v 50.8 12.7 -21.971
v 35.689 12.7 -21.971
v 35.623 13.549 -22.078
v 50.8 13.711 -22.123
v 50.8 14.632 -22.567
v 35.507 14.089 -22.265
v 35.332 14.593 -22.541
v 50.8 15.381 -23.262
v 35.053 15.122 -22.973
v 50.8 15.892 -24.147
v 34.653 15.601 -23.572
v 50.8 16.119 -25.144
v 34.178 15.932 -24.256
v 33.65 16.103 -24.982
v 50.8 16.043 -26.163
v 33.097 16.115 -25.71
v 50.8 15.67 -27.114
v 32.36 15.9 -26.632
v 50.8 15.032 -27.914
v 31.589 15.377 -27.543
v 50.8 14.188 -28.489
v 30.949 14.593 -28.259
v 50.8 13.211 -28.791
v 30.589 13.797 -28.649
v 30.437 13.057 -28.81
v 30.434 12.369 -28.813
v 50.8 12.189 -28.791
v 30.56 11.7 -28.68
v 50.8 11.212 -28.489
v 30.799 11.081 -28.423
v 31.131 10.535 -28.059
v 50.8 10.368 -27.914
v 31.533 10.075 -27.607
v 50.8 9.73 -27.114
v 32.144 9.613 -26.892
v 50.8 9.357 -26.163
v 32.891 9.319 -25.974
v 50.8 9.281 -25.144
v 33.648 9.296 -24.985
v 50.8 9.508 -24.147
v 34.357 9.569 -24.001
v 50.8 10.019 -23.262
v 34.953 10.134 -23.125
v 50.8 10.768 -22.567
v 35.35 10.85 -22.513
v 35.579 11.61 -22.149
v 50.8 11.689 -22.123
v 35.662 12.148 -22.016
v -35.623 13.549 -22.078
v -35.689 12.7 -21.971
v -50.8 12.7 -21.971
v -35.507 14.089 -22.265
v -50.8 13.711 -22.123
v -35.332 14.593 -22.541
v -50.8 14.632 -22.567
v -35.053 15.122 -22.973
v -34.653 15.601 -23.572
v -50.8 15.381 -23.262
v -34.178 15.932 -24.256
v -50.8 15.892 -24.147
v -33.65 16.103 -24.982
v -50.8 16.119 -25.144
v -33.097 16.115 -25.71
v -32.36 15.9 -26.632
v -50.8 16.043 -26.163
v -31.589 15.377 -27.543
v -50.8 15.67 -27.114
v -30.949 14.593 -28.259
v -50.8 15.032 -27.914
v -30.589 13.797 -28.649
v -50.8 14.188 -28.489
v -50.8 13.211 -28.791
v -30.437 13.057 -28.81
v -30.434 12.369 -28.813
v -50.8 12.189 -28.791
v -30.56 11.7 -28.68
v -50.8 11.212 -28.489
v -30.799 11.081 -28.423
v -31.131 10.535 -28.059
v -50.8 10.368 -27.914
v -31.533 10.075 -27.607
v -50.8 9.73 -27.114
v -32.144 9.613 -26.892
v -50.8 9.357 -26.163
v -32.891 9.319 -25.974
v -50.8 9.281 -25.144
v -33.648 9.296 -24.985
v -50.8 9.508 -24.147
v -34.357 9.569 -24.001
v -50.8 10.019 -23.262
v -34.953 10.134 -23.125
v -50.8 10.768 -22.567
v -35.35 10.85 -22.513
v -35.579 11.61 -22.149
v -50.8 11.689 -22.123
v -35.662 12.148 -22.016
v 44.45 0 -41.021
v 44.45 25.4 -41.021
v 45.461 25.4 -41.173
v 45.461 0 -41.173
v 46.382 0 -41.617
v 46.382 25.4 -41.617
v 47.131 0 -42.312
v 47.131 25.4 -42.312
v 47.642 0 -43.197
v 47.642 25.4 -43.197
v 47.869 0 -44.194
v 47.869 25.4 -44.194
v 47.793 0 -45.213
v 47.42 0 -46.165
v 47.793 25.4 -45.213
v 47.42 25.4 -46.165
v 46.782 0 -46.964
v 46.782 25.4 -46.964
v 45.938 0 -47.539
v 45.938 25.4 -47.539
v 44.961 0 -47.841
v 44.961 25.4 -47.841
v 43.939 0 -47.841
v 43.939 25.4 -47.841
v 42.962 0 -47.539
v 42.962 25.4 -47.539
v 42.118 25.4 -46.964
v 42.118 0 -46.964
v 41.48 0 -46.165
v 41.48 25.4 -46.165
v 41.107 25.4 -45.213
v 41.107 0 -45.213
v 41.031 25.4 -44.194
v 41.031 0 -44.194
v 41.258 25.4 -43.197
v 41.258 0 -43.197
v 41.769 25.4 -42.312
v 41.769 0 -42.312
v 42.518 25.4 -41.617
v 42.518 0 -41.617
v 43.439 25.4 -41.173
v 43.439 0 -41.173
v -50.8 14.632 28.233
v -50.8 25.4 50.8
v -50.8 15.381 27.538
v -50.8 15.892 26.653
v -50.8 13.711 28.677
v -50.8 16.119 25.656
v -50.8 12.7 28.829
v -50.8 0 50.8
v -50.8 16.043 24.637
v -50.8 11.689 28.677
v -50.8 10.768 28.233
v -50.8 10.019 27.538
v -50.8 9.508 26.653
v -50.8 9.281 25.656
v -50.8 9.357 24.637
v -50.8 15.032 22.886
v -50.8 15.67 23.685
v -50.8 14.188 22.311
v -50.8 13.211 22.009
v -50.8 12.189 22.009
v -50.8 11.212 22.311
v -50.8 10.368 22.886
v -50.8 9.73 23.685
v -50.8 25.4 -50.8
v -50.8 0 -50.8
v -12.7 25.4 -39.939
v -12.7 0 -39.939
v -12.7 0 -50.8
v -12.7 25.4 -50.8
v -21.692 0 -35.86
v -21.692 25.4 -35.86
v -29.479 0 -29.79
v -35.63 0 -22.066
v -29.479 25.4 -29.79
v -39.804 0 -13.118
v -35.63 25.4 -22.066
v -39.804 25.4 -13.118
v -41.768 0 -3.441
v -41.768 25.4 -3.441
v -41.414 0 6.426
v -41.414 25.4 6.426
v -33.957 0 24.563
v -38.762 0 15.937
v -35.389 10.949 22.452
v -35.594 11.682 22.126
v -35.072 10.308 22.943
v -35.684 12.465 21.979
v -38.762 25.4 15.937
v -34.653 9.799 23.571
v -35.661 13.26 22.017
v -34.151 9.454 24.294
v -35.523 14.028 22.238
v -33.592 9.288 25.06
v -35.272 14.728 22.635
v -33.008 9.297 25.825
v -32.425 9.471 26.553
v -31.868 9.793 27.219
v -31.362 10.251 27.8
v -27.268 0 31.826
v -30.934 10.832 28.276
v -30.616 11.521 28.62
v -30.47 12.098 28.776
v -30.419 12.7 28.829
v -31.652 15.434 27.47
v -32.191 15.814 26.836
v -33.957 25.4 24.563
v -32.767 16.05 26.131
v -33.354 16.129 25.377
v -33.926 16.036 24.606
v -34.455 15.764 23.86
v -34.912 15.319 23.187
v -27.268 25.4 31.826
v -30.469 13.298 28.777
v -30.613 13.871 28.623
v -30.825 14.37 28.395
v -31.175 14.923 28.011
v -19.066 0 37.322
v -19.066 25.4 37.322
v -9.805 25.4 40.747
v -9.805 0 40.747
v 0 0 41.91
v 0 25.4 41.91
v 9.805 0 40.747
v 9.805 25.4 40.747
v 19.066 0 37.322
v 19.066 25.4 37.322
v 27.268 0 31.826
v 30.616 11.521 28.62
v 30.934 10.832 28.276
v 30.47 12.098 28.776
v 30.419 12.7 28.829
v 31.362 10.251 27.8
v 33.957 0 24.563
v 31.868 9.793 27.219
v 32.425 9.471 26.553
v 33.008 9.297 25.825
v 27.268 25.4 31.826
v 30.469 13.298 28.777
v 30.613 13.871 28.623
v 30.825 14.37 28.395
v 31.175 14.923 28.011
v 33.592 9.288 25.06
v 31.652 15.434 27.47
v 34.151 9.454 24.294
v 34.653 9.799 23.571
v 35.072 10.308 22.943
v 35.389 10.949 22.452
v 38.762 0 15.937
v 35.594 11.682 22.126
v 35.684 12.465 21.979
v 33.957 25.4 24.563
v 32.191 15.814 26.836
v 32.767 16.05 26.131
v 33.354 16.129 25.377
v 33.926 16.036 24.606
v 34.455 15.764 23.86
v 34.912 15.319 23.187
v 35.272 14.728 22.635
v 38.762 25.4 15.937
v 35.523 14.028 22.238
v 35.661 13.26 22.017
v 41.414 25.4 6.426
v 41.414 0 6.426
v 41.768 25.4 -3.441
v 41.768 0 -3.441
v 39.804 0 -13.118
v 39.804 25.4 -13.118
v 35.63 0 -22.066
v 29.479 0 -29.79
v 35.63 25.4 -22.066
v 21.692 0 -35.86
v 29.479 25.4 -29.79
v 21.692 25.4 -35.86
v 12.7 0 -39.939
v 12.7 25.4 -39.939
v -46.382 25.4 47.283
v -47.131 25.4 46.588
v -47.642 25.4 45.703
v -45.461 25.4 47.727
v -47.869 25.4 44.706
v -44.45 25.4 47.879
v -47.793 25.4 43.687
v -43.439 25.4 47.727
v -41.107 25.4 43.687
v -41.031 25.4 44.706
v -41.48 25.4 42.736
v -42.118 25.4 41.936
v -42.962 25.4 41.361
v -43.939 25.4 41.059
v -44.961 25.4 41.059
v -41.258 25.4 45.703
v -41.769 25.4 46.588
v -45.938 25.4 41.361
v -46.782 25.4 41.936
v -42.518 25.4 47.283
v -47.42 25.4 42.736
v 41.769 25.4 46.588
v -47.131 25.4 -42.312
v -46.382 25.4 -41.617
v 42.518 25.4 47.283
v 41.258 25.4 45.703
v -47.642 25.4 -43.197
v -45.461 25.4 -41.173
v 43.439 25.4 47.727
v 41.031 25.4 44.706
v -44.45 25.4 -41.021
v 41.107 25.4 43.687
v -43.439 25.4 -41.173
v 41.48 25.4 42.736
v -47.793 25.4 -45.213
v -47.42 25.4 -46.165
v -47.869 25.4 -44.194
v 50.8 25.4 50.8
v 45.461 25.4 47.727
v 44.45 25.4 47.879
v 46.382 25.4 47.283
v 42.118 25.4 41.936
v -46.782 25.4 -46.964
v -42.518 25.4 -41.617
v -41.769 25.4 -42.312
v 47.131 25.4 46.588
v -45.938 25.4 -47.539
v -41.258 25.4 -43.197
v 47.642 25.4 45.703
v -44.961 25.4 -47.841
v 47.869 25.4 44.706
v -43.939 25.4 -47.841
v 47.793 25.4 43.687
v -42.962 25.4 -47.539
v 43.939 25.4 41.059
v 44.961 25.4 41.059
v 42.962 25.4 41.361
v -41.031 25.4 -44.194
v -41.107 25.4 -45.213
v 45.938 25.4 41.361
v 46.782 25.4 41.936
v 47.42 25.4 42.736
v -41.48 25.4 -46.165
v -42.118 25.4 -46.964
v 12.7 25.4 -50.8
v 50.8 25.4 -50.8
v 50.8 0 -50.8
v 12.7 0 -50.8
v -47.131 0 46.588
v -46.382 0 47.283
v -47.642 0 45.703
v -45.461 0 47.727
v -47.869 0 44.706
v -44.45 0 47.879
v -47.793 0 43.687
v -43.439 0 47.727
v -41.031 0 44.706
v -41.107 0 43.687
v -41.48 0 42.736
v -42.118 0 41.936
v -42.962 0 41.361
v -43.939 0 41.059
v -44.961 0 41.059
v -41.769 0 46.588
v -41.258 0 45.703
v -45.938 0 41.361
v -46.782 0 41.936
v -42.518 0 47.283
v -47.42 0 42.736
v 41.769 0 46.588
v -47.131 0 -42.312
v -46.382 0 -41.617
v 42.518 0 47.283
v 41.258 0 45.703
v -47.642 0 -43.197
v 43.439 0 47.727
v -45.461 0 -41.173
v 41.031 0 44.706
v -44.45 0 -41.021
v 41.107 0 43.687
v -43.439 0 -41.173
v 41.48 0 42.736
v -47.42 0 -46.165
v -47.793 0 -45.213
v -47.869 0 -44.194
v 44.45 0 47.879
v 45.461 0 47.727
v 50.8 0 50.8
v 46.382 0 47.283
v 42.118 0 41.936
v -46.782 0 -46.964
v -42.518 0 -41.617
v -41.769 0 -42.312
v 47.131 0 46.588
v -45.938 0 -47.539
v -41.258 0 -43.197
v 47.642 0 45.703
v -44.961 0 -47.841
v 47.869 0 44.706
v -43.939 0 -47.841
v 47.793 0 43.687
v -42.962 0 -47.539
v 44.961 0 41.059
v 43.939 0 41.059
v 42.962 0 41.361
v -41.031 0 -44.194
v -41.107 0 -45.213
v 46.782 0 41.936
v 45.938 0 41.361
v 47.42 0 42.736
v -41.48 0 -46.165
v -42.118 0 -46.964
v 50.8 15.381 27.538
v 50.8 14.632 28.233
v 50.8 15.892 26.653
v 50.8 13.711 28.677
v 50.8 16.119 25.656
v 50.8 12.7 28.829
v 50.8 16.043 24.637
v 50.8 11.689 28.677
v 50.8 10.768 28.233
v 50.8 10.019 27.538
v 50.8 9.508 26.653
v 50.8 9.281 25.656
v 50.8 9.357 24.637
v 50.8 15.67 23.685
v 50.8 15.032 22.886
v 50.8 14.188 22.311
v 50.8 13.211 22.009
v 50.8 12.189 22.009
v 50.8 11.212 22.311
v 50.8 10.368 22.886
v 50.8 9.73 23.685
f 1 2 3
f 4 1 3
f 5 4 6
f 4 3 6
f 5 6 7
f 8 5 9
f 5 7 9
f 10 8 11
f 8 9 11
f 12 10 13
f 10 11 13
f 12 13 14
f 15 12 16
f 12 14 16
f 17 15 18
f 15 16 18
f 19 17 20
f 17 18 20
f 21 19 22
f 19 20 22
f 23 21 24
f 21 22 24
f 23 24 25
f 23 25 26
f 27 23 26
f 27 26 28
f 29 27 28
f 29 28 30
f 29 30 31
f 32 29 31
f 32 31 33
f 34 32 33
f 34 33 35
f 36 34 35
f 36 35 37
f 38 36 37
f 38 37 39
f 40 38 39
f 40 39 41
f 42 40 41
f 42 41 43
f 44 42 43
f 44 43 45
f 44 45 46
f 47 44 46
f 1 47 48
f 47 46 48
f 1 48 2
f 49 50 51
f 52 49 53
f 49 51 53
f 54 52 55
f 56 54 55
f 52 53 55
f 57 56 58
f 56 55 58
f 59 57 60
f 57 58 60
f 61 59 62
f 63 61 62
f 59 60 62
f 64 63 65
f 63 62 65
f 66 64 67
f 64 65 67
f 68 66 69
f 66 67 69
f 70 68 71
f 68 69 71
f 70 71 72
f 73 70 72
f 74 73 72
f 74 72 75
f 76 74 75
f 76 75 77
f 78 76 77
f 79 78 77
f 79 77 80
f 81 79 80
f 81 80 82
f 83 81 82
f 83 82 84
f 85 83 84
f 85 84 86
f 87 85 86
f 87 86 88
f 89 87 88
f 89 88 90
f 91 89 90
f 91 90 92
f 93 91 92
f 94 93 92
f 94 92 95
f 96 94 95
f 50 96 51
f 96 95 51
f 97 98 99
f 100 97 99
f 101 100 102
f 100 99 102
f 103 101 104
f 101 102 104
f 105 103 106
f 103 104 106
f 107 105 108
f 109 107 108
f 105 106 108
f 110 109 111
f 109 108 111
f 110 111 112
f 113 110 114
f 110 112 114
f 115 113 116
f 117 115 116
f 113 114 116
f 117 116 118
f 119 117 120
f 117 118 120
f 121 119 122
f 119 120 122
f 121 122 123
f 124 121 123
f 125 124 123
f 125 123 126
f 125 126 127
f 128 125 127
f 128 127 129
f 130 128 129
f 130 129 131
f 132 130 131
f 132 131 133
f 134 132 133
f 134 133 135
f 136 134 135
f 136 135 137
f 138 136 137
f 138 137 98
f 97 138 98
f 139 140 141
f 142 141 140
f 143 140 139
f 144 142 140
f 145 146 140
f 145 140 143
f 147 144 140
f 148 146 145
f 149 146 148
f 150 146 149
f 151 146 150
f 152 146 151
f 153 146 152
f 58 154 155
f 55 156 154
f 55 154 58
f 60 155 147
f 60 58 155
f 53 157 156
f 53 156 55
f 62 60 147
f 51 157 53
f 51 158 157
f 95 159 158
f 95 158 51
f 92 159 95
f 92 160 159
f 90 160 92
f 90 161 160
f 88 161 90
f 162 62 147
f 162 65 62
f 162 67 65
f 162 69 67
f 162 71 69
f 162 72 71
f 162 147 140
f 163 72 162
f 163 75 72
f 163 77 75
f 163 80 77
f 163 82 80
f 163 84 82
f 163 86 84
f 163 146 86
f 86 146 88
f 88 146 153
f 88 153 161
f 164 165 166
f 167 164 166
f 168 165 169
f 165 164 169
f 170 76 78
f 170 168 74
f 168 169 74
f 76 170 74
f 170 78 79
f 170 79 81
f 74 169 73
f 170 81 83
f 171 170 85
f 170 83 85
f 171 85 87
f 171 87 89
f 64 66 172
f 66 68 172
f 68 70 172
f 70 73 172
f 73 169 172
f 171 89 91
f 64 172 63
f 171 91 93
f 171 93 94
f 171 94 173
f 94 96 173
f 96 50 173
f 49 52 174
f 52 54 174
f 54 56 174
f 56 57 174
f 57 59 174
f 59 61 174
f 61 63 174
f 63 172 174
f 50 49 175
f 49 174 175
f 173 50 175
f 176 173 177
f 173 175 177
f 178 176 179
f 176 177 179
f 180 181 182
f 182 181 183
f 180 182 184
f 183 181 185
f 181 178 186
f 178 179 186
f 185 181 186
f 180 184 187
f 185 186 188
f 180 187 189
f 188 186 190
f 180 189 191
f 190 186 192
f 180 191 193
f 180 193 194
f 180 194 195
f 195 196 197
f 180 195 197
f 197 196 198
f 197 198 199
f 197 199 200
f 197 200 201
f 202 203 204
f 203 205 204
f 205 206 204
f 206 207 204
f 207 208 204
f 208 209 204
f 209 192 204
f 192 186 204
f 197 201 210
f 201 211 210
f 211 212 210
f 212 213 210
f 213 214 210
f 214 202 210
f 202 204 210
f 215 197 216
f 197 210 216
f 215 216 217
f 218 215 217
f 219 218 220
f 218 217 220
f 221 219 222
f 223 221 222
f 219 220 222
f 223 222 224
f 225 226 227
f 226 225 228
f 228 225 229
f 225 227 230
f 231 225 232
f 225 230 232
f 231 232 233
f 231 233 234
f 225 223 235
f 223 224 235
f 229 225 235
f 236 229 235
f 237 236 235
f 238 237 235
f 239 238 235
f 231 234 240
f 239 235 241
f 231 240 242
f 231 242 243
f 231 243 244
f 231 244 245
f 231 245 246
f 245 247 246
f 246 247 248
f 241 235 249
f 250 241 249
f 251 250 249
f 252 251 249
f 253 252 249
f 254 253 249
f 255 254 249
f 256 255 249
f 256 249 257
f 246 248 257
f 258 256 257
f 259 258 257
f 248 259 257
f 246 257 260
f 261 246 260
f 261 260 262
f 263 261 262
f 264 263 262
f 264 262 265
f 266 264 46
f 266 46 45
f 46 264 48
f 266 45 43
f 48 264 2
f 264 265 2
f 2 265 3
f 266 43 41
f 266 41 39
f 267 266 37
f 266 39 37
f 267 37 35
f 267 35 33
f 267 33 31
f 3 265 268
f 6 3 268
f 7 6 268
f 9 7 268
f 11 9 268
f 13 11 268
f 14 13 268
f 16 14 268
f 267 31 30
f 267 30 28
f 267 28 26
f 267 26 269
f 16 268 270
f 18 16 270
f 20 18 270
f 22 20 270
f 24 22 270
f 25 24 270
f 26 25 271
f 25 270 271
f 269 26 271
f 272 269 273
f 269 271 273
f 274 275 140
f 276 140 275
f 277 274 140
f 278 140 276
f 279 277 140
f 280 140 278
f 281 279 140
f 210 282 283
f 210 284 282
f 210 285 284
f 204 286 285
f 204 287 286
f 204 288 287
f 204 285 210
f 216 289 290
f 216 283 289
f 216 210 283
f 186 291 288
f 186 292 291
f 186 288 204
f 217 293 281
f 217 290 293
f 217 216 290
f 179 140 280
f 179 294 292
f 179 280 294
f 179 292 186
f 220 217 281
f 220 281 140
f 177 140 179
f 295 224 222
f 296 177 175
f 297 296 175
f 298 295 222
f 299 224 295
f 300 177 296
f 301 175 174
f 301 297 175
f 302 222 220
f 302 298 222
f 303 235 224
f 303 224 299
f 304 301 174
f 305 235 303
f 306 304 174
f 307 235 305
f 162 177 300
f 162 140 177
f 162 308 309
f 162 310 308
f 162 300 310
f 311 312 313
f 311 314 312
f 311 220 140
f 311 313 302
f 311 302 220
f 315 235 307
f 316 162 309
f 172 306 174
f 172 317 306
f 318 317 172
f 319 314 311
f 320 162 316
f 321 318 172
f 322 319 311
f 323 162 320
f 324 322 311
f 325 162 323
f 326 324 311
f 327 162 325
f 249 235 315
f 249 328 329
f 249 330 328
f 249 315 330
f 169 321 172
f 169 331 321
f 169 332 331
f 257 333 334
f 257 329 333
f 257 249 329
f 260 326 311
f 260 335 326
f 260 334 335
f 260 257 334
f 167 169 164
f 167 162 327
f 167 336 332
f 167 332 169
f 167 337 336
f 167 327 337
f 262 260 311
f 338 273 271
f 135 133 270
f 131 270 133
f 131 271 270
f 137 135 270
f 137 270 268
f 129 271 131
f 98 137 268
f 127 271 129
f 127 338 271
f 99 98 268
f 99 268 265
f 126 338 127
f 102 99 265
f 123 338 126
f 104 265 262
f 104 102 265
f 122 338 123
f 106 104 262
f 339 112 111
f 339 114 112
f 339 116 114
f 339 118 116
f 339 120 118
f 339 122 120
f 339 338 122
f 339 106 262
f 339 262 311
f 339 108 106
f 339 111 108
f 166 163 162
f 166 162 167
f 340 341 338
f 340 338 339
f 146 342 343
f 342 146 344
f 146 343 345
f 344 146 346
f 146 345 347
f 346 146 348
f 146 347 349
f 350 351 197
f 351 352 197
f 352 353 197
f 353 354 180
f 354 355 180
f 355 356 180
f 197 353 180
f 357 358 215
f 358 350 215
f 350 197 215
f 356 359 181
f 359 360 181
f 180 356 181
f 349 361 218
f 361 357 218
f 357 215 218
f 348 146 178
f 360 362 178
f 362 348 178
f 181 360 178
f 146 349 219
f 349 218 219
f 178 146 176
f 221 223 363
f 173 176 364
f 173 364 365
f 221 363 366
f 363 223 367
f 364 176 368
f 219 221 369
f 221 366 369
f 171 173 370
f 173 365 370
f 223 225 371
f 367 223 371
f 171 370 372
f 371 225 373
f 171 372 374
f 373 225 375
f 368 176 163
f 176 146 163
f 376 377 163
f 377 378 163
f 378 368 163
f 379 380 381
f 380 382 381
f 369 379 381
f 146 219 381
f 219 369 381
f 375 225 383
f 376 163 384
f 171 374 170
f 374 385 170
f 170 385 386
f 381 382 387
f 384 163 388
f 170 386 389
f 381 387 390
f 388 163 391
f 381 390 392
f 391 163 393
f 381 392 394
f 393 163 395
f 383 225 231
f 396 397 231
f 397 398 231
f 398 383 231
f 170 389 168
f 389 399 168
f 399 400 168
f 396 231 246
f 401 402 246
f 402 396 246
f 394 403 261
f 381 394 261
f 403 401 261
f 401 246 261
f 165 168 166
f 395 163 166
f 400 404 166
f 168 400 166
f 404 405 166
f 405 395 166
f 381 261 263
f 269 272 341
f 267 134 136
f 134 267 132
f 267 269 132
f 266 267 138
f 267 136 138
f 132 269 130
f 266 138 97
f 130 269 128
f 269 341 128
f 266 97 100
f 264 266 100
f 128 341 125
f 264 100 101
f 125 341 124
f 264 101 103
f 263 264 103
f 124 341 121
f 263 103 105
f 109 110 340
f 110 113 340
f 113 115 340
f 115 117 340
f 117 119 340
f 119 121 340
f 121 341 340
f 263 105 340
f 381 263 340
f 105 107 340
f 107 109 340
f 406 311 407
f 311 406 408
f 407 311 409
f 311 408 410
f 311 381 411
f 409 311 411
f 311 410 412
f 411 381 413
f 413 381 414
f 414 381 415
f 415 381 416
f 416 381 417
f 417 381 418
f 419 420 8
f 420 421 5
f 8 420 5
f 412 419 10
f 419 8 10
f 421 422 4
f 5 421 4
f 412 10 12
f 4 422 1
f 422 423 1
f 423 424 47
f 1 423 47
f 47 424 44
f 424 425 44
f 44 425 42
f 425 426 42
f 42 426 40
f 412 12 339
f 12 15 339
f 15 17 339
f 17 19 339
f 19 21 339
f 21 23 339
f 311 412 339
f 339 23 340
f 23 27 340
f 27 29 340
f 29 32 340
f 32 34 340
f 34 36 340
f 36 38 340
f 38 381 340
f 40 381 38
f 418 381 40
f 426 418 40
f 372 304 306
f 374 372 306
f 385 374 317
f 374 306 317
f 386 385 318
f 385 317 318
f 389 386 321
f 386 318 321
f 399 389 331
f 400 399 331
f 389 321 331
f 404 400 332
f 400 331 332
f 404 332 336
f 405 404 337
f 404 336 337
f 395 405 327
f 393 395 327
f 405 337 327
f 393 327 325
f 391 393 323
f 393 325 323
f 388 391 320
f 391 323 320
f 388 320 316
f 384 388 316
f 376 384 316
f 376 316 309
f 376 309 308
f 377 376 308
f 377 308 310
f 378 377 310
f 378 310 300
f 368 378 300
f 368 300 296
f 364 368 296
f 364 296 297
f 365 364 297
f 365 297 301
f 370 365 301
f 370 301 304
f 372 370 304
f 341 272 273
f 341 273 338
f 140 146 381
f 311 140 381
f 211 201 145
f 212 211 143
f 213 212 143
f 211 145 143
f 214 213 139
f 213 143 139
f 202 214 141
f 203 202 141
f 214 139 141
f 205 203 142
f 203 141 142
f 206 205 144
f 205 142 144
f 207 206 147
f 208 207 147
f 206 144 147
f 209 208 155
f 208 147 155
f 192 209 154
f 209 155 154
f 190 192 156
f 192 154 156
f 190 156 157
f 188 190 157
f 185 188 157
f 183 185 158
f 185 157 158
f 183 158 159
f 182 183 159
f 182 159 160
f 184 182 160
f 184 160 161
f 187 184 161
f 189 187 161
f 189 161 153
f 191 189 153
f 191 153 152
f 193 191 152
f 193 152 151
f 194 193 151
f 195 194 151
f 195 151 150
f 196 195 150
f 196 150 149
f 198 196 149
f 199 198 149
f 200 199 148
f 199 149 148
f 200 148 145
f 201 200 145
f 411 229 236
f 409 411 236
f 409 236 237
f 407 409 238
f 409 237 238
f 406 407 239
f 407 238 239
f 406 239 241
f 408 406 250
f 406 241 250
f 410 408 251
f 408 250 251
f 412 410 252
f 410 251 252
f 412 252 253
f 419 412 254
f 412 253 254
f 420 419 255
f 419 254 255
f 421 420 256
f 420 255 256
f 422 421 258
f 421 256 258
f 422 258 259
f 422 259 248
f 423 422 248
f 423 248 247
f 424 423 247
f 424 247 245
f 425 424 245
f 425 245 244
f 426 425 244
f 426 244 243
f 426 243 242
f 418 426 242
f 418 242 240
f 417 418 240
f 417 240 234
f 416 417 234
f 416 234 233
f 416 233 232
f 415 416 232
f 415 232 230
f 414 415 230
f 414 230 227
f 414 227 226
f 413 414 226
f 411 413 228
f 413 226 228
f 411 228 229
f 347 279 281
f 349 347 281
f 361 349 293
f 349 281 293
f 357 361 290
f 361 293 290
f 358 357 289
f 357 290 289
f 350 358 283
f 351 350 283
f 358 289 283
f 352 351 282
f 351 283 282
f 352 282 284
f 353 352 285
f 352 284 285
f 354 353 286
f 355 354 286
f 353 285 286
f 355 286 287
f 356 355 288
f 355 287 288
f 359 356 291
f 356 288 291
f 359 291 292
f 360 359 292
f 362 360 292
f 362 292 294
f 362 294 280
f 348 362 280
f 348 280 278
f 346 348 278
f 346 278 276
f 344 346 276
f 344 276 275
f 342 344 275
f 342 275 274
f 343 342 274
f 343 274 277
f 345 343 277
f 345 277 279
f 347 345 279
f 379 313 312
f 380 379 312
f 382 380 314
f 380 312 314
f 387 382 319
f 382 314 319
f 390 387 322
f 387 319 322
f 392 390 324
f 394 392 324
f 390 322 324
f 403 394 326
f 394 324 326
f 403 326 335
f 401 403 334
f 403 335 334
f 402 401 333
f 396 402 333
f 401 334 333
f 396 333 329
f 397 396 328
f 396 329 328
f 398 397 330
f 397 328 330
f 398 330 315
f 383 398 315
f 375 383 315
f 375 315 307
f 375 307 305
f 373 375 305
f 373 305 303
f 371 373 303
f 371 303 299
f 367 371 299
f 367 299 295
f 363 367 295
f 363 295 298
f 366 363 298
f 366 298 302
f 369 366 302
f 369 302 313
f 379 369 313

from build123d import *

# Parameters (mm, degrees)
SKETCH1_W           = 101.6
SKETCH1_H           = 101.6
BOSS_EXTRUDE1_DEPTH = 25.4
SKETCH2_R           = 41.91
CUT_EXTRUDE1_DEPTH  = 77.2
SKETCH3_W           = 25.4
SKETCH3_H           = 34.66394105
CUT_EXTRUDE2_DEPTH  = 77.2
SKETCH4_R           = 3.429
CUT_EXTRUDE3_DEPTH  = 77.2
SKETCH5_R           = 3.429
CUT_EXTRUDE4_DEPTH  = 117.397422652


with BuildPart() as part:
    # Sketch1 → Boss-Extrude1 (new body)
    with BuildSketch(Plane(origin=(0, 0, 0), x_dir=(1, 0, 0), z_dir=(0, 1, 0))):
        Rectangle(SKETCH1_W, SKETCH1_H)
    extrude(amount=BOSS_EXTRUDE1_DEPTH)

    # Sketch2 → Cut-Extrude1 (cut, through all)
    with BuildSketch(Plane(origin=(0, 25.4, 0), x_dir=(1, 0, 0), z_dir=(0, 1, 0))):
        with Locations(Location((0, 0, 0), (0, 0, 270))):
            Circle(SKETCH2_R)
    extrude(amount=-CUT_EXTRUDE1_DEPTH, mode=Mode.SUBTRACT)

    # Sketch3 → Cut-Extrude2 (cut, through all)
    with BuildSketch(Plane(origin=(0, 0, 0), x_dir=(1, 0, 0), z_dir=(0, 1, 0))):
        with Locations((0, 50.8)):
            Rectangle(SKETCH3_W, SKETCH3_H)
    extrude(amount=CUT_EXTRUDE2_DEPTH, mode=Mode.SUBTRACT)

    # Sketch4 → Cut-Extrude3 (cut, through all)
    with BuildSketch(Plane(origin=(0, 25.4, 0), x_dir=(1, 0, 0), z_dir=(0, 1, 0))):
        with Locations(Location((-44.45, 44.45, 0), (0, 0, 270))):
            Circle(SKETCH4_R)
        with Locations(Location((44.45, 44.45, 0), (0, 0, 270))):
            Circle(SKETCH4_R)
        with Locations(Location((44.45, -44.45, 0), (0, 0, 270))):
            Circle(SKETCH4_R)
        with Locations(Location((-44.45, -44.45, 0), (0, 0, 270))):
            Circle(SKETCH4_R)
    extrude(amount=-CUT_EXTRUDE3_DEPTH, mode=Mode.SUBTRACT)

    # Sketch5 → Cut-Extrude4 (cut, through all)
    with BuildSketch(Plane.ZY.offset(50.8)):
        with Locations((-25.4, 12.7)):
            Circle(SKETCH5_R)
        with Locations((25.4, 12.7)):
            Circle(SKETCH5_R)
    extrude(amount=-CUT_EXTRUDE4_DEPTH, mode=Mode.SUBTRACT)


solid = part.part
